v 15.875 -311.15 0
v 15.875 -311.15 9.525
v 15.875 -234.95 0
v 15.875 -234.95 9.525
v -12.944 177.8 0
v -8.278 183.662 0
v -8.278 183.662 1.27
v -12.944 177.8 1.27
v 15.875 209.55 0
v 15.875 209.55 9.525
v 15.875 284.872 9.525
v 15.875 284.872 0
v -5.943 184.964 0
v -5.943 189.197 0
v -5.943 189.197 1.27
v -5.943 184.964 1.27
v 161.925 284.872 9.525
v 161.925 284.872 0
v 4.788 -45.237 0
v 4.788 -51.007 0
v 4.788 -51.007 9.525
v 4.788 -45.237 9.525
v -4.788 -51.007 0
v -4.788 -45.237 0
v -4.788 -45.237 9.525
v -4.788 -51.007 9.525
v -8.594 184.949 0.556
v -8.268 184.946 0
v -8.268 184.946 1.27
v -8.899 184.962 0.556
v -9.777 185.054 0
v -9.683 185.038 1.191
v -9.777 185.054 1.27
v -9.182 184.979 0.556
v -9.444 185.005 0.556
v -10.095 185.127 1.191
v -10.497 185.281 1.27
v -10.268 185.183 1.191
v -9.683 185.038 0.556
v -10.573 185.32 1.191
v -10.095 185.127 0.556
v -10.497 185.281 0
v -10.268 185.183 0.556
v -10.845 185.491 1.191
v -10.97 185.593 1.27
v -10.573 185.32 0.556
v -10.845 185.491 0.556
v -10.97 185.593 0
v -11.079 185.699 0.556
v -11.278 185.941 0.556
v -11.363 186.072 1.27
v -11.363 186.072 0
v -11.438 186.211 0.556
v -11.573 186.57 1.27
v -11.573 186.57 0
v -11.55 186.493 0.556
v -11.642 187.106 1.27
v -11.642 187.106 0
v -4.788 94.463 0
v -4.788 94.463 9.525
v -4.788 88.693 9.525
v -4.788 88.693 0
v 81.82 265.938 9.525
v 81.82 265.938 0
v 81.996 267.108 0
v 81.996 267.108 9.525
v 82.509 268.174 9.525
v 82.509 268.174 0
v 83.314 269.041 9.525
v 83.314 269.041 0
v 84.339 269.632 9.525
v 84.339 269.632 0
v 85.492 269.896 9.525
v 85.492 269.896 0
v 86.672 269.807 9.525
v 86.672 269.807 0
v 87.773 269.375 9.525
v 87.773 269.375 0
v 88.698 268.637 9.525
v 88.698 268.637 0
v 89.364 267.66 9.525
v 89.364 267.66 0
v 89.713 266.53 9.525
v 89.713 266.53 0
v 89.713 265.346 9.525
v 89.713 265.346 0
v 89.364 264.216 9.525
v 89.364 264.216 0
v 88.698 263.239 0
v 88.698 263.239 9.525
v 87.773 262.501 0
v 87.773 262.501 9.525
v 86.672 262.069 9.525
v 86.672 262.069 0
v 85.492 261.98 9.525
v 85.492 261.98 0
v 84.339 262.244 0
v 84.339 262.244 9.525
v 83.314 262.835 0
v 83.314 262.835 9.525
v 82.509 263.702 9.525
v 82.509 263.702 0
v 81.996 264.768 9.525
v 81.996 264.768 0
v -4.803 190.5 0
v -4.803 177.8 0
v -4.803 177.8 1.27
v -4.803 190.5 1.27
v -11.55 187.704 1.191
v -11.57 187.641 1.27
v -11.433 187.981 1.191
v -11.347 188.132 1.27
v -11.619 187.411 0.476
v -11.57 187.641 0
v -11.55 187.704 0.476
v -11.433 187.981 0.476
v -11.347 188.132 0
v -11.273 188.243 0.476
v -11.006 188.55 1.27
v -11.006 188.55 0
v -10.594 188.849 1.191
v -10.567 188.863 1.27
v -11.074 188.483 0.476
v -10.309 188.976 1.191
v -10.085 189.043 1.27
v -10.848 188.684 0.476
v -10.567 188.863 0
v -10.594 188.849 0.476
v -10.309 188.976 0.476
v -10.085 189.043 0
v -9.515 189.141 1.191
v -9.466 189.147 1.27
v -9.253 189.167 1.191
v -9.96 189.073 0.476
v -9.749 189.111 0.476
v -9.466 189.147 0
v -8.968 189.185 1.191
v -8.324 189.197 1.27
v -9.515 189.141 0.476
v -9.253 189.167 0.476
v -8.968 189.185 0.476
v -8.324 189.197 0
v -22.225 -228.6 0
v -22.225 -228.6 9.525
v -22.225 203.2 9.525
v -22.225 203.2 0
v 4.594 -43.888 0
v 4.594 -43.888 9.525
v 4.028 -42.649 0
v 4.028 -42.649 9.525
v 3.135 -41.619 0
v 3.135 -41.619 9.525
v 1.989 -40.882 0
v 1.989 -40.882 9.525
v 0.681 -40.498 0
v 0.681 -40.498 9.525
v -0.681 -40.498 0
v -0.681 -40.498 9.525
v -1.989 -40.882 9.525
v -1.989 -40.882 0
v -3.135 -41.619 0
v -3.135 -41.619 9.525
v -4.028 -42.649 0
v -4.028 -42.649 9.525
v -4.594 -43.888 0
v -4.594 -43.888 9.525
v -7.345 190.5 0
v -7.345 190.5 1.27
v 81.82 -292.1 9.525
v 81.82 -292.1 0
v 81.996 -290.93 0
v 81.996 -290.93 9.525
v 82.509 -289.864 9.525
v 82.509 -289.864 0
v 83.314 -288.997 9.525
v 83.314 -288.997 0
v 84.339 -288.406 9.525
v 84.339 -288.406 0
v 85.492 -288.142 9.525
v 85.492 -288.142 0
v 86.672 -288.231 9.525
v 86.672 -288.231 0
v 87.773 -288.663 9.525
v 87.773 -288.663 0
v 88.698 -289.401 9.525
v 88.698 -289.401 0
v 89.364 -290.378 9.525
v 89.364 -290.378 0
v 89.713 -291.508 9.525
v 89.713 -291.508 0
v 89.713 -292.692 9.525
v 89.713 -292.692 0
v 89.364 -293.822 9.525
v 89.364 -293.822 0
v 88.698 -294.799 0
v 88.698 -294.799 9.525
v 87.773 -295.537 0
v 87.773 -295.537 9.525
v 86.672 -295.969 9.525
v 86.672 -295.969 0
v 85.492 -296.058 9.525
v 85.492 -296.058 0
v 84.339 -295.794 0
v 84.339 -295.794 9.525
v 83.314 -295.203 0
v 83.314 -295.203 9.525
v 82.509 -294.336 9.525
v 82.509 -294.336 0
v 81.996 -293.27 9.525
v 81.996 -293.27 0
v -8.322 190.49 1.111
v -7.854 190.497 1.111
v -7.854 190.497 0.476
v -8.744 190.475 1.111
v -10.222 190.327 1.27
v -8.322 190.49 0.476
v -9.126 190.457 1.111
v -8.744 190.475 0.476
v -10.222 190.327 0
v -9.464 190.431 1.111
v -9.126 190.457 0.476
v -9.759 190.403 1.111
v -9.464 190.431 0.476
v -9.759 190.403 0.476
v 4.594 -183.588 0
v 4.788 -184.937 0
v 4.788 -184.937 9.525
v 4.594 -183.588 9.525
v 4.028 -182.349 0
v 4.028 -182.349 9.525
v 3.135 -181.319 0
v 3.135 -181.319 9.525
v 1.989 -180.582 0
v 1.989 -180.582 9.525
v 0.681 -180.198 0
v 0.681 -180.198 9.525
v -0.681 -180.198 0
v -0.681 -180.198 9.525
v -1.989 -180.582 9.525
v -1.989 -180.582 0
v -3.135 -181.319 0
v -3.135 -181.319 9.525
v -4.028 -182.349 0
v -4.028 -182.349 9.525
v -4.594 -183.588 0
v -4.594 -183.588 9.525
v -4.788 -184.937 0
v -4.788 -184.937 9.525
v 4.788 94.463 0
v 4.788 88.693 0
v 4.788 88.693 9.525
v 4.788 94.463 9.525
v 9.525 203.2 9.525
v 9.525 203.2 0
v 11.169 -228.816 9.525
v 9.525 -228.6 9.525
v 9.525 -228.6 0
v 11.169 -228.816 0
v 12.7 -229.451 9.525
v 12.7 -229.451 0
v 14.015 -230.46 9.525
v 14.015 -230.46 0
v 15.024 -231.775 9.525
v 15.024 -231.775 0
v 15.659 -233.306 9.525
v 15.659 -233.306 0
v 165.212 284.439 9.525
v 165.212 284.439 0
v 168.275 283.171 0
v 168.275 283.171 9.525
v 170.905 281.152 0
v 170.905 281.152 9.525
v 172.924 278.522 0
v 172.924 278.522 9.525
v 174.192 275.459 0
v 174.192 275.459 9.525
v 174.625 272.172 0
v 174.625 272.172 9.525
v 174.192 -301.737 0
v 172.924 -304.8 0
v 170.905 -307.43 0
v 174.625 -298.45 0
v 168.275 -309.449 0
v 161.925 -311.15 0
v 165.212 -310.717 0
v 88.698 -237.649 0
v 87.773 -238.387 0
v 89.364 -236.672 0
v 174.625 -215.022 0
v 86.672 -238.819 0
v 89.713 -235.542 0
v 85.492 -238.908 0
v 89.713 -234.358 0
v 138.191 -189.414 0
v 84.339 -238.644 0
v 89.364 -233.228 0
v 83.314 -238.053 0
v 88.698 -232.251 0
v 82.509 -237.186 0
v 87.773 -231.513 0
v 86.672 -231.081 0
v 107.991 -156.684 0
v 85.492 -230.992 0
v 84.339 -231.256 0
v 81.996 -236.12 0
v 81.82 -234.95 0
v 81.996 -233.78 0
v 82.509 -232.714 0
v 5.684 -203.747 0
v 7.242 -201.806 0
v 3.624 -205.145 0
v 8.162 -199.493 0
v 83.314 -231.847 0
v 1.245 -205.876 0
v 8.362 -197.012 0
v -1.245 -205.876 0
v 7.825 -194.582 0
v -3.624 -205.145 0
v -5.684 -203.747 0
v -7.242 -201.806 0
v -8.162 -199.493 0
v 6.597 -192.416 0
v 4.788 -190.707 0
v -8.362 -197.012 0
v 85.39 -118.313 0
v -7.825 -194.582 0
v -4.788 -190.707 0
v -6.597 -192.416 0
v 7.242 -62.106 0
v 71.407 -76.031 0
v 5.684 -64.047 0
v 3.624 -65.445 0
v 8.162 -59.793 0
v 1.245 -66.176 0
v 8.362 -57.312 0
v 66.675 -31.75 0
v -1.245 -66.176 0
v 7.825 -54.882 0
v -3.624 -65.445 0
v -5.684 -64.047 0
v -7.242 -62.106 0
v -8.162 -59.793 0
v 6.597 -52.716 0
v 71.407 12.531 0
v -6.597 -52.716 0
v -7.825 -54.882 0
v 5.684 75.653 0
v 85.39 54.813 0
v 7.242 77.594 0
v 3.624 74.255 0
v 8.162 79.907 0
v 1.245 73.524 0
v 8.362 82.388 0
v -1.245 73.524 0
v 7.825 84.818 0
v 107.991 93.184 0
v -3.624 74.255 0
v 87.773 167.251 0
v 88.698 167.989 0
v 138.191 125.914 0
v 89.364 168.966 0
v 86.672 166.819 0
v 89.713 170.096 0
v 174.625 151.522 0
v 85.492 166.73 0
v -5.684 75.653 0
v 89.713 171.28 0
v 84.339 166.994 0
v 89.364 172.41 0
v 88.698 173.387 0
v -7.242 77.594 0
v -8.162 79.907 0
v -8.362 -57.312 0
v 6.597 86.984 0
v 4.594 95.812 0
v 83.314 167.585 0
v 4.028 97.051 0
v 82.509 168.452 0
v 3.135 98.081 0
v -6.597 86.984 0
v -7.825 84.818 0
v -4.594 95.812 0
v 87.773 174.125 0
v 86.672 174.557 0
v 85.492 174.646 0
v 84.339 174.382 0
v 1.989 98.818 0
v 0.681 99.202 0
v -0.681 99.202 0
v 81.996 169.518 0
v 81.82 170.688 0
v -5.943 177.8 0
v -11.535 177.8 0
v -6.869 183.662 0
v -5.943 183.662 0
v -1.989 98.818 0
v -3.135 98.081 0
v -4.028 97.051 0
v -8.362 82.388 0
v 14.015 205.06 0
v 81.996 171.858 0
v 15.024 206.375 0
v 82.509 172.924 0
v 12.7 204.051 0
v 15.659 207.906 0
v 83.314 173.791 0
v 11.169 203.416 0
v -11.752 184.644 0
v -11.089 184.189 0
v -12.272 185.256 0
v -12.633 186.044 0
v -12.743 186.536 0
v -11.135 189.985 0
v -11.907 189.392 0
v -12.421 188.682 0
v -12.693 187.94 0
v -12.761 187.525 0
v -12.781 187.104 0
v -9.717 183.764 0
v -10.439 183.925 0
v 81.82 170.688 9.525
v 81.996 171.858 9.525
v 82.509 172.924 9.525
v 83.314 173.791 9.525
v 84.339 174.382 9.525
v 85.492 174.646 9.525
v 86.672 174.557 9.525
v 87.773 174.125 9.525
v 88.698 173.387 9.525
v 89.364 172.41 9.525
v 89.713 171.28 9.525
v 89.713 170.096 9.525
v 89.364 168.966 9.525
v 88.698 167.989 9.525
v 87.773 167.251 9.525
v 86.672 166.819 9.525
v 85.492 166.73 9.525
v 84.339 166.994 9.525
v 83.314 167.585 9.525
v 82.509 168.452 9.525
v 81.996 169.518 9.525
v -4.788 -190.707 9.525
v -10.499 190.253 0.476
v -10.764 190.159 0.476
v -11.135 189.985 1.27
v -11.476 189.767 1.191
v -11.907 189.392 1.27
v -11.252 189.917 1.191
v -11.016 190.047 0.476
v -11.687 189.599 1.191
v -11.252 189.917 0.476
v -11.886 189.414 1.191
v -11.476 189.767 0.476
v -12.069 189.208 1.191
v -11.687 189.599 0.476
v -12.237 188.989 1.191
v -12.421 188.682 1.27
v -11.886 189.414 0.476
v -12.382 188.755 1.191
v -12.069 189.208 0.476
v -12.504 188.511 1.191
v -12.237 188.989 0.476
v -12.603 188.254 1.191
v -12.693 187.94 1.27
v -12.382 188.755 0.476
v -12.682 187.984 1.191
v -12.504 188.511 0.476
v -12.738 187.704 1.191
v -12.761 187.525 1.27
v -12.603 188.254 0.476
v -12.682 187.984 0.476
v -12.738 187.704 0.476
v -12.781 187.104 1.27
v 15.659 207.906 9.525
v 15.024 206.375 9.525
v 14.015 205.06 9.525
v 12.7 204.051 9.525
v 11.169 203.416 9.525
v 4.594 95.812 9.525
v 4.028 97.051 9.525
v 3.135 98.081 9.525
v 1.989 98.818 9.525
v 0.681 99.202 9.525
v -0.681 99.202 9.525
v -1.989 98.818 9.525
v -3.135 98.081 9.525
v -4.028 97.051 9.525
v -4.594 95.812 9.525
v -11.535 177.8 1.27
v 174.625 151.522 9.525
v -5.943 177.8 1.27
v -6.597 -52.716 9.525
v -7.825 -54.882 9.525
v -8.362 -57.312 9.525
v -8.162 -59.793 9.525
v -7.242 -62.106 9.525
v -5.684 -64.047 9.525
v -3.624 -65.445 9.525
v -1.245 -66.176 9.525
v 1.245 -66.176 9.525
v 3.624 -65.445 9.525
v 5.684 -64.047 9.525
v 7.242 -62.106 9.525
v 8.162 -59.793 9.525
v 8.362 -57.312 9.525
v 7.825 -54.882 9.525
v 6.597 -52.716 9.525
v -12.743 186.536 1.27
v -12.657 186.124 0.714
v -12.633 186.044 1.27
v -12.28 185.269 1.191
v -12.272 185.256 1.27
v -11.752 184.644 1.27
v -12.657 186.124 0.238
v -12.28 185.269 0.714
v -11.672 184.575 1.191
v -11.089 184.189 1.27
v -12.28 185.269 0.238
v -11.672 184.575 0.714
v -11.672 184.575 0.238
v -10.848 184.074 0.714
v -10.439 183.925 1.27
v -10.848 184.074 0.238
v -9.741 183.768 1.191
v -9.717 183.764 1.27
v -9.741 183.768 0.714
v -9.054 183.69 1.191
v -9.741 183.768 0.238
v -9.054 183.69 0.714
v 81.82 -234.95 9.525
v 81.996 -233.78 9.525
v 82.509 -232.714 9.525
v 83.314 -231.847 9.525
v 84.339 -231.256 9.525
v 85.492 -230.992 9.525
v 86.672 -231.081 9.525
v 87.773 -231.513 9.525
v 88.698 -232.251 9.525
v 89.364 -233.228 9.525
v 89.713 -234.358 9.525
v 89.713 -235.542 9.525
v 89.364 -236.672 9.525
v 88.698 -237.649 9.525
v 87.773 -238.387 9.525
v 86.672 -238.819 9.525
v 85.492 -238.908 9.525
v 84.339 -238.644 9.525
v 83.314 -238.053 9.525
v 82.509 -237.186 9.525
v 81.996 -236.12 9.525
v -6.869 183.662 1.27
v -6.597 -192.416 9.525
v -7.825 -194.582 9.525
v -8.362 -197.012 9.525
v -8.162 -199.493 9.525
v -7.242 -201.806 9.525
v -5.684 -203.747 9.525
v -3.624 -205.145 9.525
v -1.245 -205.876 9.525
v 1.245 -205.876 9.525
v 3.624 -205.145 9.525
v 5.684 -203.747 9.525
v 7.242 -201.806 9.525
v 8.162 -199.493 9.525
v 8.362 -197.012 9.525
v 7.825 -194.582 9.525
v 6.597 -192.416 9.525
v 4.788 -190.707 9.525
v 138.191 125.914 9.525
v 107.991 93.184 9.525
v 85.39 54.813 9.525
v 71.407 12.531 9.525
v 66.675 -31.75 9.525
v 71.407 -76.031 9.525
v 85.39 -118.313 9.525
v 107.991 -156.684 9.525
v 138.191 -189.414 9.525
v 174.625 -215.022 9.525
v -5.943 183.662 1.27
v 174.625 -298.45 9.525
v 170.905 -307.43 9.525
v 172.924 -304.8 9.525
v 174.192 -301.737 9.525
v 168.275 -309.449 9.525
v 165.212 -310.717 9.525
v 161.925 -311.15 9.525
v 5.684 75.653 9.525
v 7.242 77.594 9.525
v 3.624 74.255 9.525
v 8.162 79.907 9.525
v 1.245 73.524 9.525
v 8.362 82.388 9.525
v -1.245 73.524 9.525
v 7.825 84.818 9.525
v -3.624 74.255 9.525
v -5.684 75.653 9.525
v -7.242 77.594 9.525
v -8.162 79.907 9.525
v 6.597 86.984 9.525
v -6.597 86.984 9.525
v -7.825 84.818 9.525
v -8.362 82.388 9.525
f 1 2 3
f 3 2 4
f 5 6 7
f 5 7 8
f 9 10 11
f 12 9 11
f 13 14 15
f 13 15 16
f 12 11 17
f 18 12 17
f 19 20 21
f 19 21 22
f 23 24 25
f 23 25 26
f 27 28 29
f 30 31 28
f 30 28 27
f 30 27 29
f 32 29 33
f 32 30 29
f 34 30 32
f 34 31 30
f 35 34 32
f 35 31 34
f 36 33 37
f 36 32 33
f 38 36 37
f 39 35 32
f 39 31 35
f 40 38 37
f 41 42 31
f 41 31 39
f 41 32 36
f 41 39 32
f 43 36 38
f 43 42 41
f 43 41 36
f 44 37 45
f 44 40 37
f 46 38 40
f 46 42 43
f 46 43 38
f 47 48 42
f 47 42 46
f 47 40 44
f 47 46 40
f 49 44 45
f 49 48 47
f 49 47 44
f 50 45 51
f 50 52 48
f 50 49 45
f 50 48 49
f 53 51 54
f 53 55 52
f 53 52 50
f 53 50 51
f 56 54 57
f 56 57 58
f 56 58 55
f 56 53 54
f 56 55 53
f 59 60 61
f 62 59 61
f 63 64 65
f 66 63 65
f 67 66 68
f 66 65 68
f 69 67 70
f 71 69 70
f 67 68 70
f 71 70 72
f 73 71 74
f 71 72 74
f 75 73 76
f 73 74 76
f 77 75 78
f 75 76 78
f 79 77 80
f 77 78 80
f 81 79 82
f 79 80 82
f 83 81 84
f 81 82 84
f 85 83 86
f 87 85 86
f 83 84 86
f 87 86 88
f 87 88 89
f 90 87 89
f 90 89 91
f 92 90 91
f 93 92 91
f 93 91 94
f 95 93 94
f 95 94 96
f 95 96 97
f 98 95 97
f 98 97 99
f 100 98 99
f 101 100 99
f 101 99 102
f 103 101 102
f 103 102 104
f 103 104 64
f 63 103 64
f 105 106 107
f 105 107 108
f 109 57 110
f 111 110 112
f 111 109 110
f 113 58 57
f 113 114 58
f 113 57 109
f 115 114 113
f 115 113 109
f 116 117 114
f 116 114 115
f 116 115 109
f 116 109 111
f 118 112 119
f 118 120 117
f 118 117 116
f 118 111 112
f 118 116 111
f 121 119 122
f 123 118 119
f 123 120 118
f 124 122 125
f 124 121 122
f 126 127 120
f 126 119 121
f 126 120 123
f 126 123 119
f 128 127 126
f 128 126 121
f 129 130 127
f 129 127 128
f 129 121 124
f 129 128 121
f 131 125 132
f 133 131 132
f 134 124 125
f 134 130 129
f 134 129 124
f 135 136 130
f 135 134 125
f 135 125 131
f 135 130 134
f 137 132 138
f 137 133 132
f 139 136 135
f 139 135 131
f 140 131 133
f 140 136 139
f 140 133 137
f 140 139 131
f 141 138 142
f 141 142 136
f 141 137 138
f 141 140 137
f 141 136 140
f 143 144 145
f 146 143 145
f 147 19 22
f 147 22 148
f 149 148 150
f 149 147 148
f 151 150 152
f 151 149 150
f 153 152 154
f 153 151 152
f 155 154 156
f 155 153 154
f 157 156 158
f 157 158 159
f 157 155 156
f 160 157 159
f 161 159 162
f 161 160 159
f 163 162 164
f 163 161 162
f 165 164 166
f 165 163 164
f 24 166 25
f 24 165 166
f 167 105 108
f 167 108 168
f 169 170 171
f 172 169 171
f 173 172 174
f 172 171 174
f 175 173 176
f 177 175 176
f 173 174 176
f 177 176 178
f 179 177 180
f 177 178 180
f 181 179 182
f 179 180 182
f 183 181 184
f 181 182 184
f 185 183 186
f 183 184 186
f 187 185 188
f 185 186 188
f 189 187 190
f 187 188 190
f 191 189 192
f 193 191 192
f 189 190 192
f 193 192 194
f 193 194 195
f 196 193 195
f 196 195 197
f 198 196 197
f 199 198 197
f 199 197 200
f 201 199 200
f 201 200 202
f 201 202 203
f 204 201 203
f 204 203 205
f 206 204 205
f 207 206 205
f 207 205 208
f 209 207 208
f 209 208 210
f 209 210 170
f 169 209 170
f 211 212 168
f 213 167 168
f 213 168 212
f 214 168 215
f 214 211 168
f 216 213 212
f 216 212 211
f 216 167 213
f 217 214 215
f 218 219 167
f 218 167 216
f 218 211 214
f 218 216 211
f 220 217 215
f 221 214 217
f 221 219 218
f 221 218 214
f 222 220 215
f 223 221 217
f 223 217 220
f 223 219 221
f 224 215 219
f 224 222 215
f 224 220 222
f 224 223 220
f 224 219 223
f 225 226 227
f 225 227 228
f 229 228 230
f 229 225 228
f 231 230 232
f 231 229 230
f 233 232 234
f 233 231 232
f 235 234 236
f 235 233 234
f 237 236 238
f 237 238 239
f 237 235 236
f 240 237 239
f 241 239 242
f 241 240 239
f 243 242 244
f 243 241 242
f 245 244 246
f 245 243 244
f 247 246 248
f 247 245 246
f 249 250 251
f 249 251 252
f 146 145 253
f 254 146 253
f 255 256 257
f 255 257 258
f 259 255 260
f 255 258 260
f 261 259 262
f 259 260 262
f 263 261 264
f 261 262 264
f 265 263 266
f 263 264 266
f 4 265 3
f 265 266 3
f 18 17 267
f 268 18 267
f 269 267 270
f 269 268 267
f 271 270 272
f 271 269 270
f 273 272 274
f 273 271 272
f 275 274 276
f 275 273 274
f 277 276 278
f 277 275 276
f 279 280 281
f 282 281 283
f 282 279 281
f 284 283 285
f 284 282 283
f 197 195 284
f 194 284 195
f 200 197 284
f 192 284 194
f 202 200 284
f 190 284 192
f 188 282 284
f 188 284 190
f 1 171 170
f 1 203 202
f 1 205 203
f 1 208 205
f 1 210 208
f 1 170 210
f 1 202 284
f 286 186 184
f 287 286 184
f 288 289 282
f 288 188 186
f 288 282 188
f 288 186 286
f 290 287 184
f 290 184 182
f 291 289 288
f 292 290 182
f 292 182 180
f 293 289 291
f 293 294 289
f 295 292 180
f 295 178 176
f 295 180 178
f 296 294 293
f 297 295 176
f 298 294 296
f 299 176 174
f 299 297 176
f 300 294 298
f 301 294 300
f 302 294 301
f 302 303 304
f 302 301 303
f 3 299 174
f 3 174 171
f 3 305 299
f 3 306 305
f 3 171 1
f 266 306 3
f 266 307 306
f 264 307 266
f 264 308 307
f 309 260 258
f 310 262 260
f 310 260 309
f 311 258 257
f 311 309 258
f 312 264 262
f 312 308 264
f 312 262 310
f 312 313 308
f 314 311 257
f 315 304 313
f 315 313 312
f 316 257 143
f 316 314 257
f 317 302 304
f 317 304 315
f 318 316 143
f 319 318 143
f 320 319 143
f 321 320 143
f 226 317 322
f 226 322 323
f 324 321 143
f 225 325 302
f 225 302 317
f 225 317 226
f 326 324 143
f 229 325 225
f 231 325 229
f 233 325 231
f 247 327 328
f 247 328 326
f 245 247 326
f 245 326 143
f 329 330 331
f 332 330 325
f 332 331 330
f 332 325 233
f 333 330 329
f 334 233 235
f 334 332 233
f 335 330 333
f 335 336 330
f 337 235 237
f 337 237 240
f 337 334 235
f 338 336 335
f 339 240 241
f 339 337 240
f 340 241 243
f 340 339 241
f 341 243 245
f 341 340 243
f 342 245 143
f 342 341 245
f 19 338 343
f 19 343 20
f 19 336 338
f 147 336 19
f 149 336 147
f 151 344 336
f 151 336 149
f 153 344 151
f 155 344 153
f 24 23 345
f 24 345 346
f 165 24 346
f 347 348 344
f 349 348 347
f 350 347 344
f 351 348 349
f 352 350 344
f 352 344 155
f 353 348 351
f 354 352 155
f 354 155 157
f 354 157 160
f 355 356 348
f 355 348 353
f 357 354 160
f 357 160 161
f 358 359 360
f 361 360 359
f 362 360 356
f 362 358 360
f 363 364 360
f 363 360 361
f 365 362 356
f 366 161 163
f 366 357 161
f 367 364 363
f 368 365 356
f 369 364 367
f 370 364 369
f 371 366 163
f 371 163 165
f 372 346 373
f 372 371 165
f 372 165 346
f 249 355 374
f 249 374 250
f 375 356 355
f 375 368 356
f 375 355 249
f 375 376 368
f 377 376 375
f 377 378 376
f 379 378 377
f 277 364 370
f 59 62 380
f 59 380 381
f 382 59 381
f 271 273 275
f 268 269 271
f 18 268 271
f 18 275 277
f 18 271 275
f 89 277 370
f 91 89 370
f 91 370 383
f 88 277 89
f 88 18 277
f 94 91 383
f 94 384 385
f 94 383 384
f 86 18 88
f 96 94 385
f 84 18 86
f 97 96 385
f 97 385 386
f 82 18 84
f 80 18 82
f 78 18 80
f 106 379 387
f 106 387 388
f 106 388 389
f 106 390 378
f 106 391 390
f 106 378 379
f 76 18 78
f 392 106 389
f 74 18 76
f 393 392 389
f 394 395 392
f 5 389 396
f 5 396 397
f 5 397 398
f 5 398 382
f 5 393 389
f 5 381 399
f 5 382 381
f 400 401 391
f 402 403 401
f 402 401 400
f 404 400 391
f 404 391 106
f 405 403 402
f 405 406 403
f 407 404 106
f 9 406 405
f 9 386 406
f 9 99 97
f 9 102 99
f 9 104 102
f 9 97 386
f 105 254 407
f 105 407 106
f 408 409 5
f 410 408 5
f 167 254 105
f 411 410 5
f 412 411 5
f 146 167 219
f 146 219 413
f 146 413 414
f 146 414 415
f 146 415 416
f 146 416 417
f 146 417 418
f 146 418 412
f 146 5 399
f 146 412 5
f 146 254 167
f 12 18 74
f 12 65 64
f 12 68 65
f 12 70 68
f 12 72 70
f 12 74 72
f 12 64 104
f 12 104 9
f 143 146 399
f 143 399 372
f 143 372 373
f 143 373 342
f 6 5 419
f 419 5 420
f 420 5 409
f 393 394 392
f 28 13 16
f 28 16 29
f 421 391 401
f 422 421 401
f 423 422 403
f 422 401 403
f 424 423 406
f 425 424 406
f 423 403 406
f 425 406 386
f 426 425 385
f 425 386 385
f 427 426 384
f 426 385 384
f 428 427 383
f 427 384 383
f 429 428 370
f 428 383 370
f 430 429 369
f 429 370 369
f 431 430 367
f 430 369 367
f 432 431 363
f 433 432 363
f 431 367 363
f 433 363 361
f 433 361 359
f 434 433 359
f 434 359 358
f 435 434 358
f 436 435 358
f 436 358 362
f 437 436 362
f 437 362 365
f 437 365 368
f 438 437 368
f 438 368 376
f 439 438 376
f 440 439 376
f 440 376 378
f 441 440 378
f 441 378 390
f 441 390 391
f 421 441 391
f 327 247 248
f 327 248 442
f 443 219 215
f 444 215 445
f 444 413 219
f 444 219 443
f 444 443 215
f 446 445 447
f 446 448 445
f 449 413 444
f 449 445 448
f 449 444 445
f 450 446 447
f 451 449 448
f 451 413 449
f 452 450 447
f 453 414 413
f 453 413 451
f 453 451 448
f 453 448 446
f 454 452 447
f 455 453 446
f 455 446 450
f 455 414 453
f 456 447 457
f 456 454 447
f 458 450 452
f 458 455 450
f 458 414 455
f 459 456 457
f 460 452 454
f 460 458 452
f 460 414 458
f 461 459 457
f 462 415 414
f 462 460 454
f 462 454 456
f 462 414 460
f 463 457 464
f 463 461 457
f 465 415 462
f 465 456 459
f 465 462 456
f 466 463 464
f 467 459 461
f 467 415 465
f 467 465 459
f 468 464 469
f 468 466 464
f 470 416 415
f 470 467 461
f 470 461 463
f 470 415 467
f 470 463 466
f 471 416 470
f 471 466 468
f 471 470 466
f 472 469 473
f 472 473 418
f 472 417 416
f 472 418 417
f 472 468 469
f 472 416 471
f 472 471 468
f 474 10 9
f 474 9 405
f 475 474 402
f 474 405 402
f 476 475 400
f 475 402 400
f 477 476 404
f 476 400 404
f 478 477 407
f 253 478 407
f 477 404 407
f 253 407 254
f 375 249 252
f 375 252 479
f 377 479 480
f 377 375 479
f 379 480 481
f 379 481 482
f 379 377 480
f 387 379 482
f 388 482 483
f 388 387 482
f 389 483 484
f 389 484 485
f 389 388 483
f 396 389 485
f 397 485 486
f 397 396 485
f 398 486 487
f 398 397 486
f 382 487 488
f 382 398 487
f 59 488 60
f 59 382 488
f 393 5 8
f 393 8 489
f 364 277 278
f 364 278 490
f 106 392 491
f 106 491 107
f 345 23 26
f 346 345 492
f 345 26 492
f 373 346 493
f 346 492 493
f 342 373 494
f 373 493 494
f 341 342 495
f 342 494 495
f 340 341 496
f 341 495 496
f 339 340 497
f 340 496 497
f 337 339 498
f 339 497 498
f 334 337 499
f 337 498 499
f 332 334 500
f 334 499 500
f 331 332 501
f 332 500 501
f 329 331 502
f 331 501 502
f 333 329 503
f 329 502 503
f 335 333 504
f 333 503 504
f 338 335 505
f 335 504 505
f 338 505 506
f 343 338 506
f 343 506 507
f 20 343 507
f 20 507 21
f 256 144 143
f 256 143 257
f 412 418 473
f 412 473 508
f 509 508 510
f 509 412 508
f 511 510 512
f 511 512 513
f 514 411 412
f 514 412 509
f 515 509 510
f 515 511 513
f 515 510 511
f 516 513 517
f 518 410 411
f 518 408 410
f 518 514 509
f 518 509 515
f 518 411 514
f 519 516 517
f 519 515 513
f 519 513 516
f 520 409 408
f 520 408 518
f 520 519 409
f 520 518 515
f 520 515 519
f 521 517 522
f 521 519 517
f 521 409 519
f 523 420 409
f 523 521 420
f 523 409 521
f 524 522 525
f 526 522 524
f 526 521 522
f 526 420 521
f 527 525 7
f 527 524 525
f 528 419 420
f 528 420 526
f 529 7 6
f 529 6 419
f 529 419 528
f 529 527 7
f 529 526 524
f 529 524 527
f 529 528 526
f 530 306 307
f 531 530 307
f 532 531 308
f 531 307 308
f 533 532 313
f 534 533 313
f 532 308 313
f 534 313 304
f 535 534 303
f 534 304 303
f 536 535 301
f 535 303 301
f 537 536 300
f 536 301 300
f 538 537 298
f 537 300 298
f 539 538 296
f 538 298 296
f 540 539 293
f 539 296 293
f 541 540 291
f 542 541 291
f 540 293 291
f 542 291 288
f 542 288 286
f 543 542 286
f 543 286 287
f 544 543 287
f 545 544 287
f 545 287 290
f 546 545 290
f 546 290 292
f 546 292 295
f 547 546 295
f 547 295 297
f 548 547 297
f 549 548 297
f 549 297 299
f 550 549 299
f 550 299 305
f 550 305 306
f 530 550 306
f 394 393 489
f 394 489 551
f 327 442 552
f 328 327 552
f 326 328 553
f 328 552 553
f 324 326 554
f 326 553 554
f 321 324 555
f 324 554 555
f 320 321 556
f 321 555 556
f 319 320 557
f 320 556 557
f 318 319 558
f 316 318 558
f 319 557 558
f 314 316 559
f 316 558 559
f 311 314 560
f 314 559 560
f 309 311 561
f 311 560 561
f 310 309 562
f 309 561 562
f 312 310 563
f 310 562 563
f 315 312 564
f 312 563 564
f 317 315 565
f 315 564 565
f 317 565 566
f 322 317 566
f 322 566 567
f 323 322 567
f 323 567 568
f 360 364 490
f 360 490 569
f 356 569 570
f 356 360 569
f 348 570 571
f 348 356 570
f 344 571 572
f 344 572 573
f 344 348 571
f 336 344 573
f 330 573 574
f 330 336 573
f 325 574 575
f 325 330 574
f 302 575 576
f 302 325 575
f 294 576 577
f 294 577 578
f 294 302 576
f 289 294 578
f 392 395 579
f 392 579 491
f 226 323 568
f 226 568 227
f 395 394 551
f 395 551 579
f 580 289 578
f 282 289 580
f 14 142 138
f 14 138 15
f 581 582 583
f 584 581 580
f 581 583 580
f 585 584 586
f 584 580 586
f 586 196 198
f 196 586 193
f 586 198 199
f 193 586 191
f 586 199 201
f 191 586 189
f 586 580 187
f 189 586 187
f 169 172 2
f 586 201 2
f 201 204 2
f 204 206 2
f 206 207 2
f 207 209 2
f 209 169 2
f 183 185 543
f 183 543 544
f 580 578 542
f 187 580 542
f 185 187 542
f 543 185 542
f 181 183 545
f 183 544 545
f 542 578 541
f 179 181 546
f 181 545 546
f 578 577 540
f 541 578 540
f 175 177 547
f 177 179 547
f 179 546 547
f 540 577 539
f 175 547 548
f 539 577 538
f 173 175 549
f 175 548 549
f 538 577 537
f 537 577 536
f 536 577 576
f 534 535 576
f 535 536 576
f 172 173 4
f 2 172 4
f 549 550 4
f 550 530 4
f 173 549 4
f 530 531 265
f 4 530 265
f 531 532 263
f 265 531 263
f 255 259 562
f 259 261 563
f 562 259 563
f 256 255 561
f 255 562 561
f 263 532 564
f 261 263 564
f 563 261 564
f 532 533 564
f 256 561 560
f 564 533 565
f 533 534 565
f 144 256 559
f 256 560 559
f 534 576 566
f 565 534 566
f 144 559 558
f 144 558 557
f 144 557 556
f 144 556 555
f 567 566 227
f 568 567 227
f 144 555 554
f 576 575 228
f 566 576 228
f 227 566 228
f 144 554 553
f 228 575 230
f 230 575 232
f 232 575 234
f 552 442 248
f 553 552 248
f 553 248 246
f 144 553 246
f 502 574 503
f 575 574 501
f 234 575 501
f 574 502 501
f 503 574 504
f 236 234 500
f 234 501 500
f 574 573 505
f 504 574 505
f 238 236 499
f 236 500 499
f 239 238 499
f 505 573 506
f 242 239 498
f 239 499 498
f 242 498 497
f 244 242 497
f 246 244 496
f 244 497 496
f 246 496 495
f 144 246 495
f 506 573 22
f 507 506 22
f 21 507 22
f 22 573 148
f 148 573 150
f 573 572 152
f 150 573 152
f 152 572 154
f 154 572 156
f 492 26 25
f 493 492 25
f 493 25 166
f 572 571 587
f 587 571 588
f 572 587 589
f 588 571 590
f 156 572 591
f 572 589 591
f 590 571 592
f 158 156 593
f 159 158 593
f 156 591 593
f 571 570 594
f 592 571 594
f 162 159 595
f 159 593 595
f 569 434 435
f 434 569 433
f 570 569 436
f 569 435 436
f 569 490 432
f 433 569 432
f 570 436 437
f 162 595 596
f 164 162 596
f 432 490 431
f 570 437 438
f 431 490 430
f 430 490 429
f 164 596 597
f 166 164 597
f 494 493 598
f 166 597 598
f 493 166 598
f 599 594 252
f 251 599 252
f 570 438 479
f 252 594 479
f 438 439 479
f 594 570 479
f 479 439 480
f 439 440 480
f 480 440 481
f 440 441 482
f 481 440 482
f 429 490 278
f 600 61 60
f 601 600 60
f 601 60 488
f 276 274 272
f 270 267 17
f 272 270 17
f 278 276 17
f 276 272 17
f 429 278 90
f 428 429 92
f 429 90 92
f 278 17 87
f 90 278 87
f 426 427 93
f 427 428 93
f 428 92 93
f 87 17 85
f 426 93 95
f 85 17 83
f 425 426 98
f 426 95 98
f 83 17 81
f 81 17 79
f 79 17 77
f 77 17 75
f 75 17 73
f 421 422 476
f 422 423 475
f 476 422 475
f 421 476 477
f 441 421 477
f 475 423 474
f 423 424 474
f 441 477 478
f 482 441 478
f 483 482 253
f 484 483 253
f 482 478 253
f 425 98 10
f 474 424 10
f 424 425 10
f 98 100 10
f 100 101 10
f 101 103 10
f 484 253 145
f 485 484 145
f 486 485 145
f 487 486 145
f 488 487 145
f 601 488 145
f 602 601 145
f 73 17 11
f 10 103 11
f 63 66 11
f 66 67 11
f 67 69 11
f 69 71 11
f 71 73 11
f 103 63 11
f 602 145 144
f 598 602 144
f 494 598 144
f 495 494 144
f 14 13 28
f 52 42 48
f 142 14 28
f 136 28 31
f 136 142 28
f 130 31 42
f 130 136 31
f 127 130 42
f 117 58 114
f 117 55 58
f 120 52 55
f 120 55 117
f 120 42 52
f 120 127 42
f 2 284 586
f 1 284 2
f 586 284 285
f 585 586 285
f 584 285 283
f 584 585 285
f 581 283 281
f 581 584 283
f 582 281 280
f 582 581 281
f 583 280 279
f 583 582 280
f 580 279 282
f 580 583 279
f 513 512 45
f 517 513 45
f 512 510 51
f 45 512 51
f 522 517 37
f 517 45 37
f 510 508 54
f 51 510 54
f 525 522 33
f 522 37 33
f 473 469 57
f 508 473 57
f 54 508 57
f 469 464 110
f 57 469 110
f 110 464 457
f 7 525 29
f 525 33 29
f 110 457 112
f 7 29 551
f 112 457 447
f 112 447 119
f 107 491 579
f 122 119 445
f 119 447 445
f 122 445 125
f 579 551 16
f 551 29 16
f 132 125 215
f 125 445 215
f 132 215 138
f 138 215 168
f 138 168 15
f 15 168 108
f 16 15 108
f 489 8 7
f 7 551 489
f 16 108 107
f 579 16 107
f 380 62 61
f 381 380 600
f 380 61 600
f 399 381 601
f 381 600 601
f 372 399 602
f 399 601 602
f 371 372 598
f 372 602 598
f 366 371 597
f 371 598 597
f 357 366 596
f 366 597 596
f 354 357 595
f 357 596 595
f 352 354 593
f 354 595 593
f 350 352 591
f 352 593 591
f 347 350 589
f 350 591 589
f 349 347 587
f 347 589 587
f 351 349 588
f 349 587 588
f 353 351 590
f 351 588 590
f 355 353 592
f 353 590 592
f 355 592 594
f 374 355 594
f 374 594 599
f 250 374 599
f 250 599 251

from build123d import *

# Parameters (mm, degrees)
BOSS_EXTRUDE1_DEPTH            = 9.525
V_0_377_DIAMETER_SLOT2_DEPTH   = 9.525
CUT_EXTRUDE1_REACH             = 358.93
SKETCH6_W                      = 152.4
SKETCH6_H                      = 622.3
FILLET1_R                      = 12.7
SKETCH7_R                      = 8.382
CUT_EXTRUDE2_DEPTH             = 357.929879318
SKETCH12_W                     = 38.1
SKETCH12_H                     = 107.95
SKETCH12_H_2                   = 82.55
CUT_EXTRUDE3_DEPTH             = 357.929879318
FILLET2_R                      = 6.35
F_5_16_0_3125_DIAMETER_HOLE1_D = 7.9375
SKETCH16_W                     = 158.75
SKETCH16_H                     = 26.277954941
CUT_EXTRUDE4_DEPTH             = 357.929879318
F_5_16_0_3125_DIAMETER_HOLE2_D = 7.9375
FILLET3_R                      = 12.7
CUT_EXTRUDE5_DEPTH             = 1.27


# Read off the part's stored shape, not the designer's step: V (0.377) Diameter Slot2
with BuildPart() as part:
    # Sketch1 → Boss-Extrude1 (new body)
    with BuildSketch(Plane.XY):
        with BuildLine():
            Line((-174.625, 151.522045059), (-174.625, 311.15))
            Line((-174.625, 311.15), (174.625, 311.15))
            Line((174.625, 311.15), (174.625, 151.522045059))
            ThreePointArc((174.625, 151.522045059), (66.675, -31.75), (174.625, -215.022045059))
            Line((174.625, -215.022045059), (174.625, -311.15))
            Line((174.625, -311.15), (-174.625, -311.15))
            Line((-174.625, -311.15), (-174.625, -215.022045059))
            ThreePointArc((-174.625, -215.022045059), (-66.675, -31.75), (-174.625, 151.522045059))
        make_face()
    extrude(amount=BOSS_EXTRUDE1_DEPTH)

    # V (0.377) Diameter Slot2 outline → V (0.377) Diameter Slot2 (cut)
    with BuildSketch(Plane.XY):
        with BuildLine():
            Line((4.7879, -57.8866), (4.7879, -45.2374))
            ThreePointArc((4.7879, -45.2374), (0, -40.4495), (-4.7879, -45.2374))
            Line((-4.7879, -45.2374), (-4.7879, -57.8866))
            ThreePointArc((-4.7879, -57.8866), (0, -62.6745), (4.7879, -57.8866))
        make_face()
        with BuildLine():
            ThreePointArc((4.7879, 94.4626), (0, 99.2505), (-4.7879, 94.4626))
            Line((-4.7879, 94.4626), (-4.7879, 81.8134))
            ThreePointArc((-4.7879, 81.8134), (0, 77.0255), (4.7879, 81.8134))
            Line((4.7879, 81.8134), (4.7879, 94.4626))
        make_face()
        with BuildLine():
            ThreePointArc((4.7879, -184.9374), (0, -180.1495), (-4.7879, -184.9374))
            Line((-4.7879, -184.9374), (-4.7879, -197.5866))
            ThreePointArc((-4.7879, -197.5866), (0, -202.3745), (4.7879, -197.5866))
            Line((4.7879, -197.5866), (4.7879, -184.9374))
        make_face()
    extrude(amount=V_0_377_DIAMETER_SLOT2_DEPTH, mode=Mode.SUBTRACT)

    # Sketch6 → Cut-Extrude1 (cut, up to next)
    with BuildSketch(Plane.XY.offset(9.525), mode=Mode.PRIVATE) as cut_extrude1_sk1:
        with Locations((-98.425, 0)):
            Rectangle(SKETCH6_W, SKETCH6_H)
    cut_extrude1_tool1 = extrude(cut_extrude1_sk1.sketch, amount=-CUT_EXTRUDE1_REACH, mode=Mode.PRIVATE) & part.part
    add(cut_extrude1_tool1.solids().sort_by_distance((-98.425, 0, 9.525))[0], mode=Mode.SUBTRACT)

    # Fillet1
    fillet1_edges = [part.edges().sort_by_distance(p)[0] for p in [
        (174.625, -311.15, 4.7625),
    ]]
    fillet(fillet1_edges, radius=FILLET1_R)

    # Sketch7 → Cut-Extrude2 (cut, through all)
    with BuildSketch(Plane.XY.offset(9.525)):
        with Locations((0, -197.5866)):
            Circle(SKETCH7_R)
        with Locations((0, 81.8134)):
            Circle(SKETCH7_R)
        with Locations((0, -57.8866)):
            Circle(SKETCH7_R)
    extrude(amount=-CUT_EXTRUDE2_DEPTH, mode=Mode.SUBTRACT)

    # Sketch12 → Cut-Extrude3 (cut, through all)
    with BuildSketch(Plane.XY.offset(9.525)):
        with Locations((-3.175, 257.175)):
            Rectangle(SKETCH12_W, SKETCH12_H)
        with Locations((-3.175, -269.875)):
            Rectangle(SKETCH12_W, SKETCH12_H_2)
    extrude(amount=-CUT_EXTRUDE3_DEPTH, mode=Mode.SUBTRACT)

    # Fillet2
    fillet2_edges = [part.edges().sort_by_distance(p)[0] for p in [
        (15.875, 203.2, 4.7625),
        (15.875, -228.6, 4.7625),
    ]]
    fillet(fillet2_edges, radius=FILLET2_R)

    # 5/16 (0.3125) Diameter Hole1 (through all)
    with Locations(Plane.XY.offset(9.525)):
        with Locations((85.7885, 170.688), (85.7885, 265.938)):
            Hole(F_5_16_0_3125_DIAMETER_HOLE1_D / 2)

    # Sketch16 → Cut-Extrude4 (cut, through all)
    with BuildSketch(Plane.XY.offset(9.525)):
        with Locations((95.25, 298.011022529)):
            Rectangle(SKETCH16_W, SKETCH16_H)
    extrude(amount=-CUT_EXTRUDE4_DEPTH, mode=Mode.SUBTRACT)

    # 5/16 (0.3125) Diameter Hole2 (through all)
    with Locations(Plane.XY.offset(9.525)):
        with Locations((85.7885, -234.95), (85.7885, -292.1)):
            Hole(F_5_16_0_3125_DIAMETER_HOLE2_D / 2)

    # Fillet3
    fillet3_edges = [part.edges().sort_by_distance(p)[0] for p in [
        (174.625, 284.872045059, 4.7625),
    ]]
    fillet(fillet3_edges, radius=FILLET3_R)

    # Sketch22 → Cut-Extrude5 (cut)
    with BuildSketch(Plane(origin=(0, 0, 0), x_dir=(-1, 0, 0), z_dir=(0, 0, -1))):
        with BuildLine():
            Line((4.803205128, 190.5), (7.344731571, 190.5))
            add(Edge.make_bspline(
                [(7.344731571, 190.5), (7.514335094, 190.499435445), (7.839992647, 190.498351437), (8.306529942, 190.492307098), (8.730445408, 190.474983007), (9.111517396, 190.460074718), (9.449738916, 190.432889674), (9.746147085, 190.406906754), (9.99937673, 190.372893757), (10.152668819, 190.341305508), (10.222075321, 190.327003205)],
                knots=[0, 0, 0, 0, 1.410062039, 2.707475311, 3.878576406, 4.937260626, 5.877586885, 6.699081471, 7.410979367, 8, 8, 8, 8], degree=3))
            add(Edge.make_bspline(
                [(10.222075321, 190.327003205), (10.314990785, 190.304046085), (10.498839576, 190.258621583), (10.763544101, 190.162611031), (11.015781791, 190.051505536), (11.254504868, 189.921008608), (11.478517596, 189.77015155), (11.690129752, 189.601538649), (11.890301576, 189.416092502), (12.070937777, 189.209137506), (12.241259479, 188.992016457), (12.384909638, 188.757234253), (12.508740007, 188.511719568), (12.607330169, 188.252975509), (12.686715958, 187.983511365), (12.74269117, 187.700886303), (12.776259765, 187.406387908), (12.779677355, 187.205517781), (12.781410256, 187.103665865)],
                knots=[0, 0, 0, 0, 1.027469482, 2.033020251, 3.019912614, 3.986113645, 4.951240523, 5.91722682, 6.890402269, 7.87763091, 8.8651537, 9.85103654, 10.82876324, 11.815024772, 12.821070561, 13.842952187, 14.906261191, 16, 16, 16, 16], degree=3))
            add(Edge.make_bspline(
                [(12.781410256, 187.103665865), (12.776079892, 186.934447057), (12.76567897, 186.604257334), (12.668705022, 186.125064993), (12.509858794, 185.678063765), (12.290971431, 185.263816479), (12.012226476, 184.890397852), (11.677219377, 184.562409628), (11.285763244, 184.287944802), (10.921348297, 184.097616054), (10.599442487, 183.975721785), (10.334435895, 183.889955569), (10.045358576, 183.823690724), (9.734980248, 183.764326817), (9.40200927, 183.719507811), (9.047243698, 183.686681597), (8.670430519, 183.666165478), (8.41157161, 183.663110203), (8.278405449, 183.661538462)],
                knots=[0, 0, 0, 0, 1.260483769, 2.459530307, 3.627416485, 4.787058657, 5.939039949, 7.08810263, 8.267026773, 9.491475466, 10.141966685, 10.831826277, 11.566392101, 12.351337768, 13.187381173, 14.07005841, 15.007169909, 16, 16, 16, 16], degree=3))
            Line((8.278405449, 183.661538462), (12.944230769, 177.8))
            Line((12.944230769, 177.8), (11.534815705, 177.8))
            Line((11.534815705, 177.8), (6.868990385, 183.661538462))
            Line((6.868990385, 183.661538462), (5.942948718, 183.661538462))
            Line((5.942948718, 183.661538462), (5.942948718, 177.8))
            Line((5.942948718, 177.8), (4.803205128, 177.8))
            Line((4.803205128, 177.8), (4.803205128, 190.5))
        make_face()
        with BuildLine():
            Line((5.942948718, 189.197435897), (5.942948718, 184.964102564))
            Line((5.942948718, 184.964102564), (8.268229167, 184.946294071))
            add(Edge.make_bspline(
                [(8.268229167, 184.946294071), (8.376796165, 184.94624604), (8.587229929, 184.946152944), (8.891669485, 184.960644647), (9.17513389, 184.977130401), (9.436538905, 185.002346598), (9.676001307, 185.034844344), (9.893401406, 185.075495173), (10.08909408, 185.122855514), (10.31732592, 185.196158556), (10.572184191, 185.31229468), (10.849158345, 185.481260918), (11.085023971, 185.69378315), (11.284297357, 185.936801119), (11.444424151, 186.203995508), (11.557316462, 186.492163476), (11.628953324, 186.794030132), (11.637402618, 187.00150498), (11.641666667, 187.106209936)],
                knots=[0, 0, 0, 0, 1.146690395, 2.22261258, 3.21895312, 4.145990853, 4.996080663, 5.770904154, 6.481378293, 7.121626537, 8.300444488, 9.431385265, 10.535395872, 11.636531494, 12.74115979, 13.810798291, 14.895190096, 16, 16, 16, 16], degree=3))
            add(Edge.make_bspline(
                [(11.641666667, 187.106209936), (11.637304684, 187.208341789), (11.628660827, 187.410729855), (11.558089581, 187.707024158), (11.438748112, 187.986667092), (11.277921706, 188.24852108), (11.081981915, 188.486213322), (10.852228709, 188.68958442), (10.594944144, 188.857403906), (10.354474367, 188.964644087), (10.139538796, 189.030393268), (9.952922601, 189.076661777), (9.742060953, 189.113834564), (9.505930003, 189.143618099), (9.2455378, 189.169217469), (8.959567723, 189.186459637), (8.649917121, 189.196669944), (8.435298256, 189.197174638), (8.324198718, 189.197435897)],
                knots=[0, 0, 0, 0, 1.101028733, 2.181837193, 3.264309656, 4.369019818, 5.486613113, 6.575447106, 7.666700264, 8.788928104, 9.402425223, 10.0903467, 10.862060571, 11.710948788, 12.657782767, 13.684531032, 14.801375019, 16, 16, 16, 16], degree=3))
            Line((8.324198718, 189.197435897), (5.942948718, 189.197435897))
        make_face(mode=Mode.SUBTRACT)
    extrude(amount=-CUT_EXTRUDE5_DEPTH, mode=Mode.SUBTRACT)


solid = part.part
